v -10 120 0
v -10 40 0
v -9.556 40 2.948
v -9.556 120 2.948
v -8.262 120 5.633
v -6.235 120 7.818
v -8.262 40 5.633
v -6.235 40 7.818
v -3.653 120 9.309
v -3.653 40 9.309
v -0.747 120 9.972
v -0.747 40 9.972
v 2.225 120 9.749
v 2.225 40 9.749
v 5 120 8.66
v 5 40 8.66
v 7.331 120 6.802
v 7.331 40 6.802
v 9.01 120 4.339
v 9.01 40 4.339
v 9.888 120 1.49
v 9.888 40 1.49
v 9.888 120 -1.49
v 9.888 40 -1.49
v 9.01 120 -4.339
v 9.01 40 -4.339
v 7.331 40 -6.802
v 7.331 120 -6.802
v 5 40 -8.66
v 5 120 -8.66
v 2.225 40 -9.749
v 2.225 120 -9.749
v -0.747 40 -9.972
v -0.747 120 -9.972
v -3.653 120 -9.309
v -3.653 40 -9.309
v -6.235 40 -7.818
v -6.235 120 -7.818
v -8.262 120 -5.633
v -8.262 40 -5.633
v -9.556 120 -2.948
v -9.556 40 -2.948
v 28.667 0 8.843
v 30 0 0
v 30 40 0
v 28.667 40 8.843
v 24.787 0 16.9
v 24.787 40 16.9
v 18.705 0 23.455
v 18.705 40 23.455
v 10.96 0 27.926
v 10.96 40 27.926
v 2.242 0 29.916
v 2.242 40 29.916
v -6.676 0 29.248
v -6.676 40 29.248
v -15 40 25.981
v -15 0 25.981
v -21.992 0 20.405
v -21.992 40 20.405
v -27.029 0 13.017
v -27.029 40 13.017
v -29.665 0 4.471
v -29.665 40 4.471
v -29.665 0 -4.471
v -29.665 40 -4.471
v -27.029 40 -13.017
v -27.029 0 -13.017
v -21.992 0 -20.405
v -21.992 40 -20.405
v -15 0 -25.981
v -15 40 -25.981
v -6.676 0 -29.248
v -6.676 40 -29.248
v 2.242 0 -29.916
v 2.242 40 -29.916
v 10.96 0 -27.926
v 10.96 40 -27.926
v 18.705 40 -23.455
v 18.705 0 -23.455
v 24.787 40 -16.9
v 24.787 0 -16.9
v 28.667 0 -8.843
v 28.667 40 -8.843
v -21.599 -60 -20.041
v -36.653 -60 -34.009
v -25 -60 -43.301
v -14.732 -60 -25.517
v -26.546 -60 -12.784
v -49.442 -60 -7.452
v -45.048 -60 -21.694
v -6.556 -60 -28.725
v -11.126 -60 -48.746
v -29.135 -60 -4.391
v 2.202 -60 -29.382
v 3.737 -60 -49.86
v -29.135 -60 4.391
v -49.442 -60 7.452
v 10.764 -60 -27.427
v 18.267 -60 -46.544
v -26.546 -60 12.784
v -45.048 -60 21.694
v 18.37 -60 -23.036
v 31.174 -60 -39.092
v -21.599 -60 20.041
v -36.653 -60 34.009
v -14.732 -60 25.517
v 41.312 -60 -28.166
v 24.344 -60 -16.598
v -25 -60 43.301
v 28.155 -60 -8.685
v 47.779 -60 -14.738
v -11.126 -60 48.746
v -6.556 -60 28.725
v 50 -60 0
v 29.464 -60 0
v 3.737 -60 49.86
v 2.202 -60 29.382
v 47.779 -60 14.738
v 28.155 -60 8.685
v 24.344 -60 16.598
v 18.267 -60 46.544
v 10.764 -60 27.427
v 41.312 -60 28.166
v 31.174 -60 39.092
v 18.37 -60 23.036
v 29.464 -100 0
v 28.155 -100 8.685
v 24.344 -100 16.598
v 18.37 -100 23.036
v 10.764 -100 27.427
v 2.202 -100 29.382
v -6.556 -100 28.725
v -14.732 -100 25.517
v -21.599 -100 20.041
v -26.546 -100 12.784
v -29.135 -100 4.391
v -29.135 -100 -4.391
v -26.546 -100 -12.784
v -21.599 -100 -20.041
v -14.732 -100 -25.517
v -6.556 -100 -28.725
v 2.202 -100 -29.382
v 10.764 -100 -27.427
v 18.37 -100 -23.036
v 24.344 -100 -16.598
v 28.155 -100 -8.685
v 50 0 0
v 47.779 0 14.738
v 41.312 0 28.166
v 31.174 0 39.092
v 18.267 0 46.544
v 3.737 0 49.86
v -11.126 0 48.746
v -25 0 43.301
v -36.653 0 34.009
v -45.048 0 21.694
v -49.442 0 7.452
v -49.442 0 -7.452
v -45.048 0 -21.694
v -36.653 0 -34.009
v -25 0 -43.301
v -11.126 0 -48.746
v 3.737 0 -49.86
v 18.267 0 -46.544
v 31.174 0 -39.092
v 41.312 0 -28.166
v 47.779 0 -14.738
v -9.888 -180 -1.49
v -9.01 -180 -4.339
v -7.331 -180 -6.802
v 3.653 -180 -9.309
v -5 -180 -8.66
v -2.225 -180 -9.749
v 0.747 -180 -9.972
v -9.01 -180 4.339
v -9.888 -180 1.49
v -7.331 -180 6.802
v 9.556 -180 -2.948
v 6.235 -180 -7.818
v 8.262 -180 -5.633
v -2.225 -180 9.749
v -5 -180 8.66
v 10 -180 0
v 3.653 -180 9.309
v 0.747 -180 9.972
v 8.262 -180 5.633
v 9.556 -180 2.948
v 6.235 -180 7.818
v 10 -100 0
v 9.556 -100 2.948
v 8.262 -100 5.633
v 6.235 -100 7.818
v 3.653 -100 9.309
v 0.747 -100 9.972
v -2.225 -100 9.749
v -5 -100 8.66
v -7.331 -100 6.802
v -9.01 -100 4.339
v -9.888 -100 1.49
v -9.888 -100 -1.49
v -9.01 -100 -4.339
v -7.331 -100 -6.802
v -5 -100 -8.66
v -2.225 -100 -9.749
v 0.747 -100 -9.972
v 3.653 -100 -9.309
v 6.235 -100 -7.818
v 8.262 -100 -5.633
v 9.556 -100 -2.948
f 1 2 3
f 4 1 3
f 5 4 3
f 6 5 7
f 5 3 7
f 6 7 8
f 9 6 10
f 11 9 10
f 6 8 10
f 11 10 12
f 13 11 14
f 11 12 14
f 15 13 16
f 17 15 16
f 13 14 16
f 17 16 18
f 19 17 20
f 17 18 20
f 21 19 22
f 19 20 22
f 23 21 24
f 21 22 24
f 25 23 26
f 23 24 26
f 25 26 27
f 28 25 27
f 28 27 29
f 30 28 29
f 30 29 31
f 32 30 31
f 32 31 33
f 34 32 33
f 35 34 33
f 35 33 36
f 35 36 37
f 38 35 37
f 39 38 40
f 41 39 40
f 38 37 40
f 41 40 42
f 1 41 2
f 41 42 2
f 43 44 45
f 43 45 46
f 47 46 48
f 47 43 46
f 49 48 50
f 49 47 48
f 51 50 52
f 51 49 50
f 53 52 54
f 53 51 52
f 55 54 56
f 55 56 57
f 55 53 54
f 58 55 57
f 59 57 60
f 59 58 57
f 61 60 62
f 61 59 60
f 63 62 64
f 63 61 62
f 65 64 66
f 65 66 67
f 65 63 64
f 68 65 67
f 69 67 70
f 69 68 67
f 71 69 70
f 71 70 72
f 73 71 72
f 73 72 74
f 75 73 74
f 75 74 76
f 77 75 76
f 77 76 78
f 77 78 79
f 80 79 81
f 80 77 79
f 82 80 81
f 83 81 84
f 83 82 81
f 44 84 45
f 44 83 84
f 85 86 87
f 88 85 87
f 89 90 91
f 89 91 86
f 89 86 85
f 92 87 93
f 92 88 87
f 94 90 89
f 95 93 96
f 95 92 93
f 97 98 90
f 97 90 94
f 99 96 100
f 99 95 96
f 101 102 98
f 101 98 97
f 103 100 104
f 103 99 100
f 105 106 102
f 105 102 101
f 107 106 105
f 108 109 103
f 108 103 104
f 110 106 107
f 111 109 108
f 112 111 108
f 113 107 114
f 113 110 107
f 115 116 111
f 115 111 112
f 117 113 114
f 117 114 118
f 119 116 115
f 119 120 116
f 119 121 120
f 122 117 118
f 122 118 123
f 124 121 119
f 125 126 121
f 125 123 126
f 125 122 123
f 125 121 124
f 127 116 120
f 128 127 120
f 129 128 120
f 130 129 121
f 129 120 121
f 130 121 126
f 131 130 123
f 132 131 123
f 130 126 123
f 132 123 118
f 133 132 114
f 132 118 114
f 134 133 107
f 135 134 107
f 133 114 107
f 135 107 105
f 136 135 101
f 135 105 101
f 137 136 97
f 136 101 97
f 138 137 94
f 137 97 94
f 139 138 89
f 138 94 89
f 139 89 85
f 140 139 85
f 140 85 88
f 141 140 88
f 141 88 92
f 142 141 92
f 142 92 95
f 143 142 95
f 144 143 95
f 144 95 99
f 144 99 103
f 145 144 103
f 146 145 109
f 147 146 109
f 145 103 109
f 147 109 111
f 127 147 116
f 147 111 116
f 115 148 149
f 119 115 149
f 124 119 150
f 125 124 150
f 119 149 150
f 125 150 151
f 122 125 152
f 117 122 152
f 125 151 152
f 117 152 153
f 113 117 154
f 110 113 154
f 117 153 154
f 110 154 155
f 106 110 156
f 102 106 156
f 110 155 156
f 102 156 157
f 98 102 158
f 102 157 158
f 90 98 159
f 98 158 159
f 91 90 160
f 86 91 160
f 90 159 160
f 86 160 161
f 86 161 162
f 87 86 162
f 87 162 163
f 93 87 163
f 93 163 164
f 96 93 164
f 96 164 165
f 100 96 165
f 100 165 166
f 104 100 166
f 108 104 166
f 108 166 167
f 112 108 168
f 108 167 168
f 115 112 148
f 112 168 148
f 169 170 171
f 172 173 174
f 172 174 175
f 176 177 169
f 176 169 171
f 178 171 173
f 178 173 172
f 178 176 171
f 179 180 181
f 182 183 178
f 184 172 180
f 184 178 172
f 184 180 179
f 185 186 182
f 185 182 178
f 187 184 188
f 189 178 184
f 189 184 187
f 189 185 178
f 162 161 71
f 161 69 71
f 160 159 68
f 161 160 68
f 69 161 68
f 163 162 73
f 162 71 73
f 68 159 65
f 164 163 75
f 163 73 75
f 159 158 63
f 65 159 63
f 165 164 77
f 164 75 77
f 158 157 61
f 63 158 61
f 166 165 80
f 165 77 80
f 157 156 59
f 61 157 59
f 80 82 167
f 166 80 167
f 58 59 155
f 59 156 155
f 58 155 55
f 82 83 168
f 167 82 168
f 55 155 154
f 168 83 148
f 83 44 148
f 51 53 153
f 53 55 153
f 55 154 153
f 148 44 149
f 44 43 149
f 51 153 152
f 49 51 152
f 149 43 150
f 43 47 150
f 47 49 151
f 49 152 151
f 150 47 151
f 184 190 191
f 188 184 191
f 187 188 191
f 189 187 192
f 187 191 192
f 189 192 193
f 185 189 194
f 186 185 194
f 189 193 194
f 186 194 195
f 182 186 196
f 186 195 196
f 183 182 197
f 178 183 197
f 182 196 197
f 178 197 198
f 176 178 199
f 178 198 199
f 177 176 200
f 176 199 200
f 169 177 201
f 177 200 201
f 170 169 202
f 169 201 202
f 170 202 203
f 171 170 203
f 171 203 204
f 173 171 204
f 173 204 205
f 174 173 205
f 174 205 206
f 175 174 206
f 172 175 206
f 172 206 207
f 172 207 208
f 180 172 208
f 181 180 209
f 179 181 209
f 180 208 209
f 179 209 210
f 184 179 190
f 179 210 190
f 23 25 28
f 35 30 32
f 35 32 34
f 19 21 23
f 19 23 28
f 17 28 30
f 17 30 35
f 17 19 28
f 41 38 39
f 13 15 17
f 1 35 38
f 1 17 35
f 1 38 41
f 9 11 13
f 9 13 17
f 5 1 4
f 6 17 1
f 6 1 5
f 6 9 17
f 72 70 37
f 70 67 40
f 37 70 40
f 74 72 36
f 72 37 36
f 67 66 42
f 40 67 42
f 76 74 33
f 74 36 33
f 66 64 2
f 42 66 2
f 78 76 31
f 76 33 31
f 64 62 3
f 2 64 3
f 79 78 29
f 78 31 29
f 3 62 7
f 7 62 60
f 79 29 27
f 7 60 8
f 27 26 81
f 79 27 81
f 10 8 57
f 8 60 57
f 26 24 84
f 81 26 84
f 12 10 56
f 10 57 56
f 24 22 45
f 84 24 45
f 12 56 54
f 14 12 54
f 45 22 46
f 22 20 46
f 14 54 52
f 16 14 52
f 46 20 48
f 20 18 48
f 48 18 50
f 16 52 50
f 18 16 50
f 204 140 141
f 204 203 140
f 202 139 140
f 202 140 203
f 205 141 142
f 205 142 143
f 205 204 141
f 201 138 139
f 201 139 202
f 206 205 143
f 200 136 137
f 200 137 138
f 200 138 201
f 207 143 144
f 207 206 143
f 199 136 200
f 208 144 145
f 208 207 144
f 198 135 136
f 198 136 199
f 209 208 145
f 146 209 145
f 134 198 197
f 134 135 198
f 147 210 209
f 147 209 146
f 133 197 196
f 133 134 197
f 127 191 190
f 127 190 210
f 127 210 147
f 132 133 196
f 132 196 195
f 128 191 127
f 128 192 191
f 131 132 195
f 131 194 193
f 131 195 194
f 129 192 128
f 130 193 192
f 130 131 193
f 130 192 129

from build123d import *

# Parameters (mm, degrees)
F0_R     = 50
F1_DEPTH = 60
F2_R     = 30
F3_DEPTH = 40
F4_R     = 10
F5_DEPTH = 80
F6_R     = 29.463917
F7_DEPTH = 40
F8_R     = 10
F9_DEPTH = 80


with BuildPart() as f1:
    # F0 (on Front) → F1 (new body)
    with BuildSketch(Plane.XZ):
        Circle(F0_R)
    extrude(amount=F1_DEPTH)

    # F2 (on Front) → F3 (join)
    with BuildSketch(Plane.XZ):
        Circle(F2_R)
    extrude(amount=-F3_DEPTH)

    # F4 (on face) → F5 (join)
    with BuildSketch(Plane(origin=(0, 40, 0), x_dir=(-1, 0, 0), z_dir=(0, 1, 0))):
        Circle(F4_R)
    extrude(amount=F5_DEPTH)

    # F6 (on face) → F7 (join)
    with BuildSketch(Plane.XZ.offset(60)):
        Circle(F6_R)
    extrude(amount=F7_DEPTH)

    # F8 (on face) → F9 (join)
    with BuildSketch(Plane.XZ.offset(100)):
        Circle(F8_R)
    extrude(amount=F9_DEPTH)


solid = f1.part
